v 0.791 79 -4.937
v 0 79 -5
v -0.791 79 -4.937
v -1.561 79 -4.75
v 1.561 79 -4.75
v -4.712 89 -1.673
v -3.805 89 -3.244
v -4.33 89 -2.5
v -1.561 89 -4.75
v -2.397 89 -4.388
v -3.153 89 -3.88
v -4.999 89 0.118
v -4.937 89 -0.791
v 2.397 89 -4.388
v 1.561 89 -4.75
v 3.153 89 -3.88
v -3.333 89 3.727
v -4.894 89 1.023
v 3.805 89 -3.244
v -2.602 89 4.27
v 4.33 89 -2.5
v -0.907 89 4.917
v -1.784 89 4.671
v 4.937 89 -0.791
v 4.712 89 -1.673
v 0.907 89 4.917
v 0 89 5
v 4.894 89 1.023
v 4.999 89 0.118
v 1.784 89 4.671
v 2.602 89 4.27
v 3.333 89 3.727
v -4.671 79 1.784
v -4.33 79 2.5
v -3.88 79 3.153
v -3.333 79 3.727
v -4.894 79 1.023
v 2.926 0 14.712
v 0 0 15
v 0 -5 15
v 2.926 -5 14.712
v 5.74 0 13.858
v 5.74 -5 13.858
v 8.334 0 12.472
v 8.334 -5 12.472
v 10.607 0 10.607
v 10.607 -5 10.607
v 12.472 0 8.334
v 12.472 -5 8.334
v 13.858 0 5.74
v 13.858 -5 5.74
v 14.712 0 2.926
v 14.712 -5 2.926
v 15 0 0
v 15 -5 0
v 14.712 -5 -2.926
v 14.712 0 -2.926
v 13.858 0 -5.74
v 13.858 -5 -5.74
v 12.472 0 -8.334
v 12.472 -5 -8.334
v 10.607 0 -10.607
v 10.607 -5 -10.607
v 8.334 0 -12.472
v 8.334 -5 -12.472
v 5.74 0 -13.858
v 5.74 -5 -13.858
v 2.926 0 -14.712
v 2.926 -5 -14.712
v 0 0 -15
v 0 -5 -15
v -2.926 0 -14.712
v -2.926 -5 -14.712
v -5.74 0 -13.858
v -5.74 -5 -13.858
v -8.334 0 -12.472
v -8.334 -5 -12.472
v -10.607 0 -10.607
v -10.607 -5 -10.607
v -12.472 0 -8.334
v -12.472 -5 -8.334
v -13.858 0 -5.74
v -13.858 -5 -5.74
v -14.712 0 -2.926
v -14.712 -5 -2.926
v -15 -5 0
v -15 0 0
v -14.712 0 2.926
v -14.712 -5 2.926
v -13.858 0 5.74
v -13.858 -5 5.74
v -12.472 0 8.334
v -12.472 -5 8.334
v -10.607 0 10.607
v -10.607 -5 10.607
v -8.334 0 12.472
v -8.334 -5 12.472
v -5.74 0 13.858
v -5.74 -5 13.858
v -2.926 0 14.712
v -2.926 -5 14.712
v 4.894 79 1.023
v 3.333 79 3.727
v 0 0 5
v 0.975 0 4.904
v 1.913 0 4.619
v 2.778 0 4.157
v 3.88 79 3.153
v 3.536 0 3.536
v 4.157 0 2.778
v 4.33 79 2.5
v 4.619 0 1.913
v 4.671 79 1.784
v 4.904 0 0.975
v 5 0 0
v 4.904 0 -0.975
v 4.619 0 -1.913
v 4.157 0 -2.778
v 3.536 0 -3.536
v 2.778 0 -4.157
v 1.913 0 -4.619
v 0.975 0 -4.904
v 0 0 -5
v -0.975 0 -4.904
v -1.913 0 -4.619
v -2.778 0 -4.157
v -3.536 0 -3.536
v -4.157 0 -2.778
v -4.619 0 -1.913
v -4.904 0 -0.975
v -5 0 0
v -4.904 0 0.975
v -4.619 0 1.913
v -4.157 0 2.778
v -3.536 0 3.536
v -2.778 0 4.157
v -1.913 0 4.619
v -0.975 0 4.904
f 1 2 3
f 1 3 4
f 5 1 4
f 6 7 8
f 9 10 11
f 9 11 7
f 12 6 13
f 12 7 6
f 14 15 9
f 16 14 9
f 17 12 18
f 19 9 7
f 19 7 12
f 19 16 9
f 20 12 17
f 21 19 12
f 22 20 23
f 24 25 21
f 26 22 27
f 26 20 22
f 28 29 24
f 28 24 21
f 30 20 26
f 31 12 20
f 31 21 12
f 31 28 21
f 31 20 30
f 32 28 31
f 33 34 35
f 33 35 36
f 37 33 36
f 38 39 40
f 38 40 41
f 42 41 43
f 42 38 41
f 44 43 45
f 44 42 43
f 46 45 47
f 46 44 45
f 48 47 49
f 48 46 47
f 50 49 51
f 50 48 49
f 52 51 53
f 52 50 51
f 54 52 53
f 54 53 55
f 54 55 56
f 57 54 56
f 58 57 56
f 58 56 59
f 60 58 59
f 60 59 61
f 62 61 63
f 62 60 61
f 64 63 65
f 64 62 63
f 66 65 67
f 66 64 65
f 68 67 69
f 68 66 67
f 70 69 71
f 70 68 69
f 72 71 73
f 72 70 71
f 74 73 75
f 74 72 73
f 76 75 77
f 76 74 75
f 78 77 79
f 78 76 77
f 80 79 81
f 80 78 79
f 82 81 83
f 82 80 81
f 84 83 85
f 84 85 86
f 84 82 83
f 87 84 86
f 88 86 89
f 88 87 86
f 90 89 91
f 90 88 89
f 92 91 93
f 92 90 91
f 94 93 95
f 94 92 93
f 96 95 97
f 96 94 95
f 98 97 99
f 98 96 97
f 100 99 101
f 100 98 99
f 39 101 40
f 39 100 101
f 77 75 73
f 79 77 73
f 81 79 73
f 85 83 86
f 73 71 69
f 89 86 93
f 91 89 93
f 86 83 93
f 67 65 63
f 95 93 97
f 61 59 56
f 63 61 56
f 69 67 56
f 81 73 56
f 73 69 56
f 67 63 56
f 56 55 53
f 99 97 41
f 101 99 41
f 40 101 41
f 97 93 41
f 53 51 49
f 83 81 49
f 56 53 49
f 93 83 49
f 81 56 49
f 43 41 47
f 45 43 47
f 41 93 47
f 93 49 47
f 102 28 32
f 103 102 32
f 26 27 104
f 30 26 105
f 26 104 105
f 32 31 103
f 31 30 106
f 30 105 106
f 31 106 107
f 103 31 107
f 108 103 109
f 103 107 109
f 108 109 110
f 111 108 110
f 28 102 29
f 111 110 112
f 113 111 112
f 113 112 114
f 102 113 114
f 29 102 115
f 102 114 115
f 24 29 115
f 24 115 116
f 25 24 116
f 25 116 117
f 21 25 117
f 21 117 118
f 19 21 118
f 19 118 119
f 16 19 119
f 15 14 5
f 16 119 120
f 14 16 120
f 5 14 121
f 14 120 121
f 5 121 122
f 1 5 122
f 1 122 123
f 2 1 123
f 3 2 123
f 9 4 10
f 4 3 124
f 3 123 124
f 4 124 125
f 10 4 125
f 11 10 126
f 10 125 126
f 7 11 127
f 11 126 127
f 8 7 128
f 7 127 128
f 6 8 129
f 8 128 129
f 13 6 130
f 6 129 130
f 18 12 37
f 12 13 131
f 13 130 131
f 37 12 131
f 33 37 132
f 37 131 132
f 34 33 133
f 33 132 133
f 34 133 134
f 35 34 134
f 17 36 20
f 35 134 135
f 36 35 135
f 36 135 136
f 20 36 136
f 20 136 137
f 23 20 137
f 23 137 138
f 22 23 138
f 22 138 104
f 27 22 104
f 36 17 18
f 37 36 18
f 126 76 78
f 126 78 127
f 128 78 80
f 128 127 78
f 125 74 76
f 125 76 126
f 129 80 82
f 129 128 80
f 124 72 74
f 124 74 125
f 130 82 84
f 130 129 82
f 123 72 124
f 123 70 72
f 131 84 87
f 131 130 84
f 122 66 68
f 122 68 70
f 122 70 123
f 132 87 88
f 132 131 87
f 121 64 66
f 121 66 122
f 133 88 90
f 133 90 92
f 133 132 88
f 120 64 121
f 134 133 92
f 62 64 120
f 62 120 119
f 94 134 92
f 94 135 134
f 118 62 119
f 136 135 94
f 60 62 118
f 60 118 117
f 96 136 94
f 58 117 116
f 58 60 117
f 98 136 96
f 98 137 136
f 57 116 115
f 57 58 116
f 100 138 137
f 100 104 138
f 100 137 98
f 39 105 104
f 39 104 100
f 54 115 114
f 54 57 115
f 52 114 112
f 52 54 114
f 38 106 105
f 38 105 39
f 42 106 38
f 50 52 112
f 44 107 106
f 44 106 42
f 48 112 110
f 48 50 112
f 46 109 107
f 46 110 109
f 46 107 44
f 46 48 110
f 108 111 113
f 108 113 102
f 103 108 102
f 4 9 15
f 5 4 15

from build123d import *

# Parameters (mm, degrees)
SKETCH1_R           = 15
BOSS_EXTRUDE1_DEPTH = 5
SKETCH2_R           = 5
BOSS_EXTRUDE2_DEPTH = 89
CUT_EXTRUDE2_START  = -10
CUT_EXTRUDE2_DEPTH  = 10
CIRPATTERN1_COUNT   = 3


with BuildPart() as part:
    # Sketch1 → Boss-Extrude1 (new body)
    with BuildSketch(Plane(origin=(0, 0, 0), x_dir=(1, 0, 0), z_dir=(0, 1, 0))):
        with Locations(Location((0, 0, 0), (0, 0, 270))):
            Circle(SKETCH1_R)
    extrude(amount=-BOSS_EXTRUDE1_DEPTH)

    # Sketch2 → Boss-Extrude2 (add)
    with BuildSketch(Plane(origin=(0, 0, 0), x_dir=(1, 0, 0), z_dir=(0, 1, 0))):
        with Locations(Location((0, 0, 0), (0, 0, 270))):
            Circle(SKETCH2_R)
    extrude(amount=BOSS_EXTRUDE2_DEPTH)

    # Sketch7 → Cut-Extrude2 (cut)
    with BuildSketch(Plane(origin=(0, 89, 0), x_dir=(1, 0, 0), z_dir=(0, 1, 0)).offset(CUT_EXTRUDE2_START)):
        with BuildLine():
            Line((-1.5612495, 4.75), (1.5612495, 4.75))
            ThreePointArc((1.5612495, 4.75), (0, 5), (-1.5612495, 4.75))
        make_face()
    cut_extrude2 = extrude(amount=CUT_EXTRUDE2_DEPTH, mode=Mode.SUBTRACT)

    # CirPattern1: Cut-Extrude2 ×3 about axis
    cirpattern1_axis = Axis((0, 0, 0), (0, 1, 0))
    for i in range(1, CIRPATTERN1_COUNT):
        add(cut_extrude2.rotate(cirpattern1_axis, i * 360 / CIRPATTERN1_COUNT), mode=Mode.SUBTRACT)


solid = part.part
